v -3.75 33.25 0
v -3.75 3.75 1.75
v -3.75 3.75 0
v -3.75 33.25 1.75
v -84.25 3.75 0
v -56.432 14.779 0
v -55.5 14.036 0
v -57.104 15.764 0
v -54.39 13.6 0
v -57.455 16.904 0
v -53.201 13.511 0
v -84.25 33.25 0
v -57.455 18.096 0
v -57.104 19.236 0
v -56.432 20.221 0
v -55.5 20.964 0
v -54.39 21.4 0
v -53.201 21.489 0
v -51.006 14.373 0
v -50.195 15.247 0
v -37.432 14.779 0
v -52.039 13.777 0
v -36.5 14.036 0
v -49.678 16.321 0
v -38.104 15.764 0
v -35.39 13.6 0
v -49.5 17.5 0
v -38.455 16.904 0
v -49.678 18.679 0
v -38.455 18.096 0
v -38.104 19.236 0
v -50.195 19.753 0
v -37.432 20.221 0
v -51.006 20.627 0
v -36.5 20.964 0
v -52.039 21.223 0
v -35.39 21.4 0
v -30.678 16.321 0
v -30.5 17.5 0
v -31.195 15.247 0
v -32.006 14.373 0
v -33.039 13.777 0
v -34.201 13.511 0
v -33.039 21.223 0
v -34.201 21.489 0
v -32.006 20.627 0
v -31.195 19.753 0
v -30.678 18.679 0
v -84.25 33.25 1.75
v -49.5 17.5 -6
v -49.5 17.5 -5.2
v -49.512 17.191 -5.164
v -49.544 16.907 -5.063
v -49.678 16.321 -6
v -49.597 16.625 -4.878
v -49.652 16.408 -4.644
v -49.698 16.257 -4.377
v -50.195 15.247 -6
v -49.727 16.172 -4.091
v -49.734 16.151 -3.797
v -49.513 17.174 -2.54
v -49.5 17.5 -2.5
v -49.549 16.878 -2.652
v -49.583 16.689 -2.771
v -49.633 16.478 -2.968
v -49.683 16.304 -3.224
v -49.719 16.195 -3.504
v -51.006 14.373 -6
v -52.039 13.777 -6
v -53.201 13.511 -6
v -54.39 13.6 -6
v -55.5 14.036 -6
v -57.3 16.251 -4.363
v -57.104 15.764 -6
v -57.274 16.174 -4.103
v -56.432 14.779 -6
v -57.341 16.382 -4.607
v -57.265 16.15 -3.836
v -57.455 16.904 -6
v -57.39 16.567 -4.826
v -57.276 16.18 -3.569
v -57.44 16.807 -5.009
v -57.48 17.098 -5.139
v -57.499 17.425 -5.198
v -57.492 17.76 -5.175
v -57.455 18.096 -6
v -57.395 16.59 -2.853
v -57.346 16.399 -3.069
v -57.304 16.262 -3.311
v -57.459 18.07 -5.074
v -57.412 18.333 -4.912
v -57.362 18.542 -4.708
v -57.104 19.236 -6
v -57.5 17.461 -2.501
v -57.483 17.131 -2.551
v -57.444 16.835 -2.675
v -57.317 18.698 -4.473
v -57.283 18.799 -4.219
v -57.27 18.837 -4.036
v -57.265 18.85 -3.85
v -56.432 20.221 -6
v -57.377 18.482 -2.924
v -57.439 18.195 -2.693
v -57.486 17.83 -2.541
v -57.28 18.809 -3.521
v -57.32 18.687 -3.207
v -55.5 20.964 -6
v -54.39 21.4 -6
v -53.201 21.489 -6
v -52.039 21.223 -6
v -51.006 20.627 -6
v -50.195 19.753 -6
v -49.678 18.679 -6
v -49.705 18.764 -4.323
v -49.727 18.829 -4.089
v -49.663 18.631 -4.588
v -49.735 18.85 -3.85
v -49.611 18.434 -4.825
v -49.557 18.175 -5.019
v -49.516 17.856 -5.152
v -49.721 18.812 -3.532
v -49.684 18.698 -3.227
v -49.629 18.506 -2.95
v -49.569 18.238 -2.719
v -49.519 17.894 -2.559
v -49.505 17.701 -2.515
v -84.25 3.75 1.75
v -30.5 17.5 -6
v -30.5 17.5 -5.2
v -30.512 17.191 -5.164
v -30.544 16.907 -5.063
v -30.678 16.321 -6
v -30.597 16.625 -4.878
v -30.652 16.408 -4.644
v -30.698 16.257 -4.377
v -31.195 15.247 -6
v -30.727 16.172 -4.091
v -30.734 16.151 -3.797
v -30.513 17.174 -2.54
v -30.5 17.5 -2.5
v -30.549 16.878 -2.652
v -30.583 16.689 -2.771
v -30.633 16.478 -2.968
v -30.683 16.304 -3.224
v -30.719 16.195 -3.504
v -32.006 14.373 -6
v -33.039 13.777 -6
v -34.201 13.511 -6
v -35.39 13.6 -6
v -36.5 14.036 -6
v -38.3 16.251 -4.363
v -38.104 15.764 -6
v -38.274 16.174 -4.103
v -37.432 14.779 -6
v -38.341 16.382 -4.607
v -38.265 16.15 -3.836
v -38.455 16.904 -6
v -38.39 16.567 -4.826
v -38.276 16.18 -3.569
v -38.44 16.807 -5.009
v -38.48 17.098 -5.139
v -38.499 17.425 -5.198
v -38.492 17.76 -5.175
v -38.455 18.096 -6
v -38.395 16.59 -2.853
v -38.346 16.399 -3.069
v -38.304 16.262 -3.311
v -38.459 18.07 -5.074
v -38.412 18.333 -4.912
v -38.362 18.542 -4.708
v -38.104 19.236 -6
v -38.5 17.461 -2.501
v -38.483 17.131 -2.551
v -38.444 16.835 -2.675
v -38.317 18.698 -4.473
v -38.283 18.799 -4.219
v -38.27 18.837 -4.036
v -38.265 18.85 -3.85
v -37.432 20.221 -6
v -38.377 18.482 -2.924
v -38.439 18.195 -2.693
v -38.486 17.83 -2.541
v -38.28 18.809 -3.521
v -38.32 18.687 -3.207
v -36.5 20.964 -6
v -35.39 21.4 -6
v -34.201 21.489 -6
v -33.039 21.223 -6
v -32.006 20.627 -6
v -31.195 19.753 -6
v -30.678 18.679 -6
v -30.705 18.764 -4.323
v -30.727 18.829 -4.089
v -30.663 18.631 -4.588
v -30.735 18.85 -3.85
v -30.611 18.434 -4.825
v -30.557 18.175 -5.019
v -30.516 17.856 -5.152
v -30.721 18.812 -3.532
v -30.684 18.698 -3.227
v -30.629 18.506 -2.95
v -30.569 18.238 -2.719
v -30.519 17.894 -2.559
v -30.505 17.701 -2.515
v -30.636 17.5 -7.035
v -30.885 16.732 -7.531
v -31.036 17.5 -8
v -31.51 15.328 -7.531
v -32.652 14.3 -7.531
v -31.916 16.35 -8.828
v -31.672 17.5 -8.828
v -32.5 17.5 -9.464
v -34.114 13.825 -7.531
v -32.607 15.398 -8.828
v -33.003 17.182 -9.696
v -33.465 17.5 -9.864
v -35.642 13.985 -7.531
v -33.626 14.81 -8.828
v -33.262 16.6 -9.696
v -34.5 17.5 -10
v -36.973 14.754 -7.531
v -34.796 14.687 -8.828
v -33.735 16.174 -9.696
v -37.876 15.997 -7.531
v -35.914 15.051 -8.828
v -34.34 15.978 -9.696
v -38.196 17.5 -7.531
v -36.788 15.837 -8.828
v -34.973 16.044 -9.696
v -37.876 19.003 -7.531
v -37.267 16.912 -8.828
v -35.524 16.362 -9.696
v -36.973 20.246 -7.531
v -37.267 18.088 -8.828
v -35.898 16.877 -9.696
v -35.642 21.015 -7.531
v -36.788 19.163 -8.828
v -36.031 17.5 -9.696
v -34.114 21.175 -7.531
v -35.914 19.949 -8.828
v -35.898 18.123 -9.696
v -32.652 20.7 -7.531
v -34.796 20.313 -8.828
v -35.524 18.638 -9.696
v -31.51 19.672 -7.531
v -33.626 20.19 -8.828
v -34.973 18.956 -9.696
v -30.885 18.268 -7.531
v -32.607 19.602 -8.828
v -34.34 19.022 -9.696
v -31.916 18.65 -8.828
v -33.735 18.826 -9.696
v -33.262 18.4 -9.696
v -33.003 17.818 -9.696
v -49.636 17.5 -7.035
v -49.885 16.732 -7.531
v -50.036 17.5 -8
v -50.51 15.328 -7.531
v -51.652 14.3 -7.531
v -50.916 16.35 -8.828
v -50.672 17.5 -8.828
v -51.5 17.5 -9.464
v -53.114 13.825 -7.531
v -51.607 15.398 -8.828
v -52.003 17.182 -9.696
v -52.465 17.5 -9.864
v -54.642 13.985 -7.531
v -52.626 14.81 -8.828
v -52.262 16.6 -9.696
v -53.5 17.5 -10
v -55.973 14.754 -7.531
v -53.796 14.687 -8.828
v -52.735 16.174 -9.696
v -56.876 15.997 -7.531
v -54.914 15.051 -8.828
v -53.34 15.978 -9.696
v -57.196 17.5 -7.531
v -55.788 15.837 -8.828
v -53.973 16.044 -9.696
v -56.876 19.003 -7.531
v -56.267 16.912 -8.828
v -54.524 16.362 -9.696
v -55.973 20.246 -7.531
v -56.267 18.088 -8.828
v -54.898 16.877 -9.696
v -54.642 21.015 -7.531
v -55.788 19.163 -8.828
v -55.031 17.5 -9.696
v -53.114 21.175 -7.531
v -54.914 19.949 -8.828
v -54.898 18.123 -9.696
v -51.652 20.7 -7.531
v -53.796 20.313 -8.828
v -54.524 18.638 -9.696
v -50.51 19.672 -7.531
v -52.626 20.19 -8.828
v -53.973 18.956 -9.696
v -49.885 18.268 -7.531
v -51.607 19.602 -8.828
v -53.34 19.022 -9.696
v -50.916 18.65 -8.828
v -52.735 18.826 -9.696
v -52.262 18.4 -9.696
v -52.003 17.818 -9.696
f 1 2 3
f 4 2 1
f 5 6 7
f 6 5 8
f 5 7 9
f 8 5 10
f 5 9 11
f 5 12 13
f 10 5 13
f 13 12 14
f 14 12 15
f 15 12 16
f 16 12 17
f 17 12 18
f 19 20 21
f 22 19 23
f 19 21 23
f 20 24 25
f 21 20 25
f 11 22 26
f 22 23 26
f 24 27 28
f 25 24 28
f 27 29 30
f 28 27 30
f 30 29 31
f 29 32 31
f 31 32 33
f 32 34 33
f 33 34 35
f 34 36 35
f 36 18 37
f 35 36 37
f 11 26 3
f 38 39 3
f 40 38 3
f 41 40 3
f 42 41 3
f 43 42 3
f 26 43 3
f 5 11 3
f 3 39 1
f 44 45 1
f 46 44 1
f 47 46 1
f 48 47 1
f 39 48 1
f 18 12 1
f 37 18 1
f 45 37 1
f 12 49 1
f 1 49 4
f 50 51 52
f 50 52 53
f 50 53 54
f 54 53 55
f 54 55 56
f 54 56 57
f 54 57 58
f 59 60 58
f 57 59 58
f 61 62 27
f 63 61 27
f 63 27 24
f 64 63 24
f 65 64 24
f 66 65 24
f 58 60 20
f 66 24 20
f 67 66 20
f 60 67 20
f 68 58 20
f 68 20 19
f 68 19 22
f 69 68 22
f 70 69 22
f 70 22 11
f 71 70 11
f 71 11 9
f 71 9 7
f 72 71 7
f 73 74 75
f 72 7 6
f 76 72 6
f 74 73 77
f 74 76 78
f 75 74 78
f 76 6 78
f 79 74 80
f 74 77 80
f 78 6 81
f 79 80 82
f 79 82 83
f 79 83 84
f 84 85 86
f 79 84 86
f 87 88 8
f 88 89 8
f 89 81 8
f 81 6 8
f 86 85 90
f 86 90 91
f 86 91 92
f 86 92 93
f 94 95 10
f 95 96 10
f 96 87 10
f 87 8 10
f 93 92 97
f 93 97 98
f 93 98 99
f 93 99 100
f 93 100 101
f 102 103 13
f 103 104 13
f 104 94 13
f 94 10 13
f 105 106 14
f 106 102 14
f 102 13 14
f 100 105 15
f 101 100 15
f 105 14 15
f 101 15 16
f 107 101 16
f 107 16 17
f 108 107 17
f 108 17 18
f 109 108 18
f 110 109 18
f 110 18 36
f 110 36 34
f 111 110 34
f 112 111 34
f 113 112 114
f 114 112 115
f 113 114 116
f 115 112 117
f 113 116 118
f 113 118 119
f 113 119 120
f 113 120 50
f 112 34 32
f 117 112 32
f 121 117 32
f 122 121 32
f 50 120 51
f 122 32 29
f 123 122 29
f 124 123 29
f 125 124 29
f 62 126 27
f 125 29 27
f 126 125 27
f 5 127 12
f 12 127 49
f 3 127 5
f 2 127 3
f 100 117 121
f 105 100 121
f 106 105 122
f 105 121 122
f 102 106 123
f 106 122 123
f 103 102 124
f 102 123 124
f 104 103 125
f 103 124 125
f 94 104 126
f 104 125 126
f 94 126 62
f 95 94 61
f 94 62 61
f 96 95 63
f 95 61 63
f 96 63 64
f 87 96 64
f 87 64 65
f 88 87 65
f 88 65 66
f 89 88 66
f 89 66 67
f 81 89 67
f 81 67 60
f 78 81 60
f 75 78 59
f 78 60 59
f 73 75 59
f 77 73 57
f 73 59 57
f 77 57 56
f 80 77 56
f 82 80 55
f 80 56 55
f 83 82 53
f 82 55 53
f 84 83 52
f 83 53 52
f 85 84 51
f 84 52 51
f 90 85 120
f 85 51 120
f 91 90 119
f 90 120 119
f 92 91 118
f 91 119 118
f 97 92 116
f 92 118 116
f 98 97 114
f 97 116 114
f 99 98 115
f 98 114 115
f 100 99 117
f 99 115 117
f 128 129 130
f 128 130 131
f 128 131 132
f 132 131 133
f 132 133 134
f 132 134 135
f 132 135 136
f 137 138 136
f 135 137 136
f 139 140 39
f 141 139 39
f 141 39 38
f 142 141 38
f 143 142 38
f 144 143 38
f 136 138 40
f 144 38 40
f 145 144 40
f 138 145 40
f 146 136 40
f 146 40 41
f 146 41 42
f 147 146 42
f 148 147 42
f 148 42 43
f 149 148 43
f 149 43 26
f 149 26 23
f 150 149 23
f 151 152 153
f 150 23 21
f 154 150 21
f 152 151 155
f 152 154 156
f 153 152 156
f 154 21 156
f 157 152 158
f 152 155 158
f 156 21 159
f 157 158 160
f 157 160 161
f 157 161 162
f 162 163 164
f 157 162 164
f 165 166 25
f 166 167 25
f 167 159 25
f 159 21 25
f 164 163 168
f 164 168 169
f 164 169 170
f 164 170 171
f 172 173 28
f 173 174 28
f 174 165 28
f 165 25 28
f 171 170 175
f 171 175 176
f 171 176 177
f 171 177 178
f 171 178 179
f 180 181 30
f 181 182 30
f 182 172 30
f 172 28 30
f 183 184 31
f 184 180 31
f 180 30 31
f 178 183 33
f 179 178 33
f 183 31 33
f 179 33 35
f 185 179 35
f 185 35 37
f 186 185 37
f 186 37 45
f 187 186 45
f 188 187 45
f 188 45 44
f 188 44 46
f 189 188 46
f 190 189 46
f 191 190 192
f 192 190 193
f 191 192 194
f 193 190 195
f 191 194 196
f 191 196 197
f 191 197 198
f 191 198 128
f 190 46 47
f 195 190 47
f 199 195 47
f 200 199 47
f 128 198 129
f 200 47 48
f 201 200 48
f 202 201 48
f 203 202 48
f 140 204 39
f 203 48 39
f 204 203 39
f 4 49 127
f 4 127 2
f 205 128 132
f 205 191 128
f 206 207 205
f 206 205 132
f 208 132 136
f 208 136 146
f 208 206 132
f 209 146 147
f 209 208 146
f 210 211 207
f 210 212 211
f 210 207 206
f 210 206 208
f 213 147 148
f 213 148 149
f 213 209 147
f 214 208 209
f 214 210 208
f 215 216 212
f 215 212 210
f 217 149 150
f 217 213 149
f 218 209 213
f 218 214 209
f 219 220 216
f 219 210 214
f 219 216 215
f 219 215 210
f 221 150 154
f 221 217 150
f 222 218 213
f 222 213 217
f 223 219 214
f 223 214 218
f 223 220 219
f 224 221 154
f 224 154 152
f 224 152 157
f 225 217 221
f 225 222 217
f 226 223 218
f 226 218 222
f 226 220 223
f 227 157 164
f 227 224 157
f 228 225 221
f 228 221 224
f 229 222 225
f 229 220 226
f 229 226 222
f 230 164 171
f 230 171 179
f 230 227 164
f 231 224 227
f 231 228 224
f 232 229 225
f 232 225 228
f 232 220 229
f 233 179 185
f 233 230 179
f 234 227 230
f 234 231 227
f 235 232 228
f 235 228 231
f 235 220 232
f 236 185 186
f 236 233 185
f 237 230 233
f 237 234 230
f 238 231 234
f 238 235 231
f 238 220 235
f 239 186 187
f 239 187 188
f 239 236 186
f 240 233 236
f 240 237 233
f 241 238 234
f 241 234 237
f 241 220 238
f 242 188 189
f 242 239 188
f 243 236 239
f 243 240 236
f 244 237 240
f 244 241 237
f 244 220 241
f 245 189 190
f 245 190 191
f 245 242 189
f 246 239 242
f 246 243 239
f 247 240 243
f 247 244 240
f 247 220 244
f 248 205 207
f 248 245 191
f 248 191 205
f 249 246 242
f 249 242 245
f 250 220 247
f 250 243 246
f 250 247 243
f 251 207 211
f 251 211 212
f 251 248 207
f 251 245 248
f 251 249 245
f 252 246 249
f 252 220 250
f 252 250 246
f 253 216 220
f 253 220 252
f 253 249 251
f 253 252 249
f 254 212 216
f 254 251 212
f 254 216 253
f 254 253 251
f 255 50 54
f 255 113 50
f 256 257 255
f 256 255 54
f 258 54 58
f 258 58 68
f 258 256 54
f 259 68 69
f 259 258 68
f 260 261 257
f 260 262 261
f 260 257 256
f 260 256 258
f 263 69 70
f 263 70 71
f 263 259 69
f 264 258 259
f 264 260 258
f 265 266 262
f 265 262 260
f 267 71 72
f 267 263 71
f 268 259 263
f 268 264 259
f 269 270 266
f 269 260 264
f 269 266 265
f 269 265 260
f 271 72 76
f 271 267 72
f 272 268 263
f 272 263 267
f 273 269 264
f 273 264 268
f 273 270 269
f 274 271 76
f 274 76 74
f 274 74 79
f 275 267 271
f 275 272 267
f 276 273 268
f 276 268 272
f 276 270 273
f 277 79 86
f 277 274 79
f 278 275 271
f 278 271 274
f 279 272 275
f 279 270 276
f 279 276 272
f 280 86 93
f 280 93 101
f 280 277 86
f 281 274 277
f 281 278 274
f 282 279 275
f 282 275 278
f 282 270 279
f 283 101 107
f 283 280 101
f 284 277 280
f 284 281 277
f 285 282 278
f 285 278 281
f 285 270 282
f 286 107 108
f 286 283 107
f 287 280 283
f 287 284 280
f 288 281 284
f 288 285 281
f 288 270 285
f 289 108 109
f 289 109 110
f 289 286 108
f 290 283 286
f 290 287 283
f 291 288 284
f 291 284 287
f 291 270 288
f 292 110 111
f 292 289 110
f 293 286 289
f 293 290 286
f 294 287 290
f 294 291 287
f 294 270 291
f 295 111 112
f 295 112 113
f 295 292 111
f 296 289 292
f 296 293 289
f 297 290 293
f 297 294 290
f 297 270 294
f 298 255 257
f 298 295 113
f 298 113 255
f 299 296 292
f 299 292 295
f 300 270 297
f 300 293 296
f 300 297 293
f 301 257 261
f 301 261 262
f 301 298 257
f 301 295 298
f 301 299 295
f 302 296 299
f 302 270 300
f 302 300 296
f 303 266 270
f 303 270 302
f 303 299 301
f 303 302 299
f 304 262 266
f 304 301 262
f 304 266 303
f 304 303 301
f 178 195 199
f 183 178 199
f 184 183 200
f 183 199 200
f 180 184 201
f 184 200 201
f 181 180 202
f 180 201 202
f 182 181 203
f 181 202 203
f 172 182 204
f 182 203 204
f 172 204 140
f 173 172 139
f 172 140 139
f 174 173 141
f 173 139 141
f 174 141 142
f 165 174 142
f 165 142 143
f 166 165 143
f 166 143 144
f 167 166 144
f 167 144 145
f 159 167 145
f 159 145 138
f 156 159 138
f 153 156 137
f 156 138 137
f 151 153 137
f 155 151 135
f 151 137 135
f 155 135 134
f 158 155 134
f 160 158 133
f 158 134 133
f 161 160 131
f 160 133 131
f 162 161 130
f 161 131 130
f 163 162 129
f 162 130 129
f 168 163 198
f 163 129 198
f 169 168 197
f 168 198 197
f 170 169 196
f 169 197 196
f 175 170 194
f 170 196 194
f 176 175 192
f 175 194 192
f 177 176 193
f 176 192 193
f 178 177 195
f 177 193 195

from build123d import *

# Parameters (mm, degrees)
F0_W      = 88
F0_H      = 37
F1_DEPTH  = 1.75
F2_W      = 80.5
F2_H      = 29.5
F3_DEPTH  = 1.5
F4_R      = 4
F5_DEPTH  = 10
F6_R      = 4
F7_R      = 1.35
F8_DEPTH  = 88.001
F9_R      = 3
F10_DEPTH = 25


with BuildPart() as f1:
    # F0 (on Top) → F1 (new body)
    with BuildSketch(Plane.XY):
        with Locations((-44, 18.5)):
            Rectangle(F0_W, F0_H)
    extrude(amount=F1_DEPTH)

    # F2 (on face) → F3 (join)
    with BuildSketch(Plane.XY.offset(1.75)):
        with Locations((-44, 18.5)):
            Rectangle(F2_W, F2_H)
    extrude(amount=F3_DEPTH)

    # F4 (on face) → F5 (join)
    with BuildSketch(Plane(origin=(0, 0, 0), x_dir=(1, 0, 0), z_dir=(0, 0, -1))):
        with Locations((-53.5, -17.5)):
            Circle(F4_R)
        with Locations((-34.5, -17.5)):
            Circle(F4_R)
    extrude(amount=F5_DEPTH)

    # F6
    f6_edges = [f1.edges().sort_by_distance(p)[0] for p in [
        (-57.5, 17.5, -10),
        (-38.5, 17.5, -10),
    ]]
    fillet(f6_edges, radius=F6_R)

    # F7 (on face) → F8 (cut, through all)
    with BuildSketch(Plane.YZ):
        with Locations((17.5, -3.85)):
            Circle(F7_R)
    extrude(amount=-F8_DEPTH, mode=Mode.SUBTRACT)

    # F9
    f9_edges = [f1.edges().sort_by_distance(p)[0] for p in [
        (-88, 0, 0.875),
        (-88, 37, 0.875),
        (0, 37, 0.875),
        (0, 0, 0.875),
    ]]
    fillet(f9_edges, radius=F9_R)

    # F2 (on face) → F10 (intersect)
    with BuildSketch(Plane.XY.offset(1.75)):
        with Locations((-44, 18.5)):
            Rectangle(F2_W, F2_H)
    extrude(amount=-F10_DEPTH, mode=Mode.INTERSECT)


solid = f1.part
